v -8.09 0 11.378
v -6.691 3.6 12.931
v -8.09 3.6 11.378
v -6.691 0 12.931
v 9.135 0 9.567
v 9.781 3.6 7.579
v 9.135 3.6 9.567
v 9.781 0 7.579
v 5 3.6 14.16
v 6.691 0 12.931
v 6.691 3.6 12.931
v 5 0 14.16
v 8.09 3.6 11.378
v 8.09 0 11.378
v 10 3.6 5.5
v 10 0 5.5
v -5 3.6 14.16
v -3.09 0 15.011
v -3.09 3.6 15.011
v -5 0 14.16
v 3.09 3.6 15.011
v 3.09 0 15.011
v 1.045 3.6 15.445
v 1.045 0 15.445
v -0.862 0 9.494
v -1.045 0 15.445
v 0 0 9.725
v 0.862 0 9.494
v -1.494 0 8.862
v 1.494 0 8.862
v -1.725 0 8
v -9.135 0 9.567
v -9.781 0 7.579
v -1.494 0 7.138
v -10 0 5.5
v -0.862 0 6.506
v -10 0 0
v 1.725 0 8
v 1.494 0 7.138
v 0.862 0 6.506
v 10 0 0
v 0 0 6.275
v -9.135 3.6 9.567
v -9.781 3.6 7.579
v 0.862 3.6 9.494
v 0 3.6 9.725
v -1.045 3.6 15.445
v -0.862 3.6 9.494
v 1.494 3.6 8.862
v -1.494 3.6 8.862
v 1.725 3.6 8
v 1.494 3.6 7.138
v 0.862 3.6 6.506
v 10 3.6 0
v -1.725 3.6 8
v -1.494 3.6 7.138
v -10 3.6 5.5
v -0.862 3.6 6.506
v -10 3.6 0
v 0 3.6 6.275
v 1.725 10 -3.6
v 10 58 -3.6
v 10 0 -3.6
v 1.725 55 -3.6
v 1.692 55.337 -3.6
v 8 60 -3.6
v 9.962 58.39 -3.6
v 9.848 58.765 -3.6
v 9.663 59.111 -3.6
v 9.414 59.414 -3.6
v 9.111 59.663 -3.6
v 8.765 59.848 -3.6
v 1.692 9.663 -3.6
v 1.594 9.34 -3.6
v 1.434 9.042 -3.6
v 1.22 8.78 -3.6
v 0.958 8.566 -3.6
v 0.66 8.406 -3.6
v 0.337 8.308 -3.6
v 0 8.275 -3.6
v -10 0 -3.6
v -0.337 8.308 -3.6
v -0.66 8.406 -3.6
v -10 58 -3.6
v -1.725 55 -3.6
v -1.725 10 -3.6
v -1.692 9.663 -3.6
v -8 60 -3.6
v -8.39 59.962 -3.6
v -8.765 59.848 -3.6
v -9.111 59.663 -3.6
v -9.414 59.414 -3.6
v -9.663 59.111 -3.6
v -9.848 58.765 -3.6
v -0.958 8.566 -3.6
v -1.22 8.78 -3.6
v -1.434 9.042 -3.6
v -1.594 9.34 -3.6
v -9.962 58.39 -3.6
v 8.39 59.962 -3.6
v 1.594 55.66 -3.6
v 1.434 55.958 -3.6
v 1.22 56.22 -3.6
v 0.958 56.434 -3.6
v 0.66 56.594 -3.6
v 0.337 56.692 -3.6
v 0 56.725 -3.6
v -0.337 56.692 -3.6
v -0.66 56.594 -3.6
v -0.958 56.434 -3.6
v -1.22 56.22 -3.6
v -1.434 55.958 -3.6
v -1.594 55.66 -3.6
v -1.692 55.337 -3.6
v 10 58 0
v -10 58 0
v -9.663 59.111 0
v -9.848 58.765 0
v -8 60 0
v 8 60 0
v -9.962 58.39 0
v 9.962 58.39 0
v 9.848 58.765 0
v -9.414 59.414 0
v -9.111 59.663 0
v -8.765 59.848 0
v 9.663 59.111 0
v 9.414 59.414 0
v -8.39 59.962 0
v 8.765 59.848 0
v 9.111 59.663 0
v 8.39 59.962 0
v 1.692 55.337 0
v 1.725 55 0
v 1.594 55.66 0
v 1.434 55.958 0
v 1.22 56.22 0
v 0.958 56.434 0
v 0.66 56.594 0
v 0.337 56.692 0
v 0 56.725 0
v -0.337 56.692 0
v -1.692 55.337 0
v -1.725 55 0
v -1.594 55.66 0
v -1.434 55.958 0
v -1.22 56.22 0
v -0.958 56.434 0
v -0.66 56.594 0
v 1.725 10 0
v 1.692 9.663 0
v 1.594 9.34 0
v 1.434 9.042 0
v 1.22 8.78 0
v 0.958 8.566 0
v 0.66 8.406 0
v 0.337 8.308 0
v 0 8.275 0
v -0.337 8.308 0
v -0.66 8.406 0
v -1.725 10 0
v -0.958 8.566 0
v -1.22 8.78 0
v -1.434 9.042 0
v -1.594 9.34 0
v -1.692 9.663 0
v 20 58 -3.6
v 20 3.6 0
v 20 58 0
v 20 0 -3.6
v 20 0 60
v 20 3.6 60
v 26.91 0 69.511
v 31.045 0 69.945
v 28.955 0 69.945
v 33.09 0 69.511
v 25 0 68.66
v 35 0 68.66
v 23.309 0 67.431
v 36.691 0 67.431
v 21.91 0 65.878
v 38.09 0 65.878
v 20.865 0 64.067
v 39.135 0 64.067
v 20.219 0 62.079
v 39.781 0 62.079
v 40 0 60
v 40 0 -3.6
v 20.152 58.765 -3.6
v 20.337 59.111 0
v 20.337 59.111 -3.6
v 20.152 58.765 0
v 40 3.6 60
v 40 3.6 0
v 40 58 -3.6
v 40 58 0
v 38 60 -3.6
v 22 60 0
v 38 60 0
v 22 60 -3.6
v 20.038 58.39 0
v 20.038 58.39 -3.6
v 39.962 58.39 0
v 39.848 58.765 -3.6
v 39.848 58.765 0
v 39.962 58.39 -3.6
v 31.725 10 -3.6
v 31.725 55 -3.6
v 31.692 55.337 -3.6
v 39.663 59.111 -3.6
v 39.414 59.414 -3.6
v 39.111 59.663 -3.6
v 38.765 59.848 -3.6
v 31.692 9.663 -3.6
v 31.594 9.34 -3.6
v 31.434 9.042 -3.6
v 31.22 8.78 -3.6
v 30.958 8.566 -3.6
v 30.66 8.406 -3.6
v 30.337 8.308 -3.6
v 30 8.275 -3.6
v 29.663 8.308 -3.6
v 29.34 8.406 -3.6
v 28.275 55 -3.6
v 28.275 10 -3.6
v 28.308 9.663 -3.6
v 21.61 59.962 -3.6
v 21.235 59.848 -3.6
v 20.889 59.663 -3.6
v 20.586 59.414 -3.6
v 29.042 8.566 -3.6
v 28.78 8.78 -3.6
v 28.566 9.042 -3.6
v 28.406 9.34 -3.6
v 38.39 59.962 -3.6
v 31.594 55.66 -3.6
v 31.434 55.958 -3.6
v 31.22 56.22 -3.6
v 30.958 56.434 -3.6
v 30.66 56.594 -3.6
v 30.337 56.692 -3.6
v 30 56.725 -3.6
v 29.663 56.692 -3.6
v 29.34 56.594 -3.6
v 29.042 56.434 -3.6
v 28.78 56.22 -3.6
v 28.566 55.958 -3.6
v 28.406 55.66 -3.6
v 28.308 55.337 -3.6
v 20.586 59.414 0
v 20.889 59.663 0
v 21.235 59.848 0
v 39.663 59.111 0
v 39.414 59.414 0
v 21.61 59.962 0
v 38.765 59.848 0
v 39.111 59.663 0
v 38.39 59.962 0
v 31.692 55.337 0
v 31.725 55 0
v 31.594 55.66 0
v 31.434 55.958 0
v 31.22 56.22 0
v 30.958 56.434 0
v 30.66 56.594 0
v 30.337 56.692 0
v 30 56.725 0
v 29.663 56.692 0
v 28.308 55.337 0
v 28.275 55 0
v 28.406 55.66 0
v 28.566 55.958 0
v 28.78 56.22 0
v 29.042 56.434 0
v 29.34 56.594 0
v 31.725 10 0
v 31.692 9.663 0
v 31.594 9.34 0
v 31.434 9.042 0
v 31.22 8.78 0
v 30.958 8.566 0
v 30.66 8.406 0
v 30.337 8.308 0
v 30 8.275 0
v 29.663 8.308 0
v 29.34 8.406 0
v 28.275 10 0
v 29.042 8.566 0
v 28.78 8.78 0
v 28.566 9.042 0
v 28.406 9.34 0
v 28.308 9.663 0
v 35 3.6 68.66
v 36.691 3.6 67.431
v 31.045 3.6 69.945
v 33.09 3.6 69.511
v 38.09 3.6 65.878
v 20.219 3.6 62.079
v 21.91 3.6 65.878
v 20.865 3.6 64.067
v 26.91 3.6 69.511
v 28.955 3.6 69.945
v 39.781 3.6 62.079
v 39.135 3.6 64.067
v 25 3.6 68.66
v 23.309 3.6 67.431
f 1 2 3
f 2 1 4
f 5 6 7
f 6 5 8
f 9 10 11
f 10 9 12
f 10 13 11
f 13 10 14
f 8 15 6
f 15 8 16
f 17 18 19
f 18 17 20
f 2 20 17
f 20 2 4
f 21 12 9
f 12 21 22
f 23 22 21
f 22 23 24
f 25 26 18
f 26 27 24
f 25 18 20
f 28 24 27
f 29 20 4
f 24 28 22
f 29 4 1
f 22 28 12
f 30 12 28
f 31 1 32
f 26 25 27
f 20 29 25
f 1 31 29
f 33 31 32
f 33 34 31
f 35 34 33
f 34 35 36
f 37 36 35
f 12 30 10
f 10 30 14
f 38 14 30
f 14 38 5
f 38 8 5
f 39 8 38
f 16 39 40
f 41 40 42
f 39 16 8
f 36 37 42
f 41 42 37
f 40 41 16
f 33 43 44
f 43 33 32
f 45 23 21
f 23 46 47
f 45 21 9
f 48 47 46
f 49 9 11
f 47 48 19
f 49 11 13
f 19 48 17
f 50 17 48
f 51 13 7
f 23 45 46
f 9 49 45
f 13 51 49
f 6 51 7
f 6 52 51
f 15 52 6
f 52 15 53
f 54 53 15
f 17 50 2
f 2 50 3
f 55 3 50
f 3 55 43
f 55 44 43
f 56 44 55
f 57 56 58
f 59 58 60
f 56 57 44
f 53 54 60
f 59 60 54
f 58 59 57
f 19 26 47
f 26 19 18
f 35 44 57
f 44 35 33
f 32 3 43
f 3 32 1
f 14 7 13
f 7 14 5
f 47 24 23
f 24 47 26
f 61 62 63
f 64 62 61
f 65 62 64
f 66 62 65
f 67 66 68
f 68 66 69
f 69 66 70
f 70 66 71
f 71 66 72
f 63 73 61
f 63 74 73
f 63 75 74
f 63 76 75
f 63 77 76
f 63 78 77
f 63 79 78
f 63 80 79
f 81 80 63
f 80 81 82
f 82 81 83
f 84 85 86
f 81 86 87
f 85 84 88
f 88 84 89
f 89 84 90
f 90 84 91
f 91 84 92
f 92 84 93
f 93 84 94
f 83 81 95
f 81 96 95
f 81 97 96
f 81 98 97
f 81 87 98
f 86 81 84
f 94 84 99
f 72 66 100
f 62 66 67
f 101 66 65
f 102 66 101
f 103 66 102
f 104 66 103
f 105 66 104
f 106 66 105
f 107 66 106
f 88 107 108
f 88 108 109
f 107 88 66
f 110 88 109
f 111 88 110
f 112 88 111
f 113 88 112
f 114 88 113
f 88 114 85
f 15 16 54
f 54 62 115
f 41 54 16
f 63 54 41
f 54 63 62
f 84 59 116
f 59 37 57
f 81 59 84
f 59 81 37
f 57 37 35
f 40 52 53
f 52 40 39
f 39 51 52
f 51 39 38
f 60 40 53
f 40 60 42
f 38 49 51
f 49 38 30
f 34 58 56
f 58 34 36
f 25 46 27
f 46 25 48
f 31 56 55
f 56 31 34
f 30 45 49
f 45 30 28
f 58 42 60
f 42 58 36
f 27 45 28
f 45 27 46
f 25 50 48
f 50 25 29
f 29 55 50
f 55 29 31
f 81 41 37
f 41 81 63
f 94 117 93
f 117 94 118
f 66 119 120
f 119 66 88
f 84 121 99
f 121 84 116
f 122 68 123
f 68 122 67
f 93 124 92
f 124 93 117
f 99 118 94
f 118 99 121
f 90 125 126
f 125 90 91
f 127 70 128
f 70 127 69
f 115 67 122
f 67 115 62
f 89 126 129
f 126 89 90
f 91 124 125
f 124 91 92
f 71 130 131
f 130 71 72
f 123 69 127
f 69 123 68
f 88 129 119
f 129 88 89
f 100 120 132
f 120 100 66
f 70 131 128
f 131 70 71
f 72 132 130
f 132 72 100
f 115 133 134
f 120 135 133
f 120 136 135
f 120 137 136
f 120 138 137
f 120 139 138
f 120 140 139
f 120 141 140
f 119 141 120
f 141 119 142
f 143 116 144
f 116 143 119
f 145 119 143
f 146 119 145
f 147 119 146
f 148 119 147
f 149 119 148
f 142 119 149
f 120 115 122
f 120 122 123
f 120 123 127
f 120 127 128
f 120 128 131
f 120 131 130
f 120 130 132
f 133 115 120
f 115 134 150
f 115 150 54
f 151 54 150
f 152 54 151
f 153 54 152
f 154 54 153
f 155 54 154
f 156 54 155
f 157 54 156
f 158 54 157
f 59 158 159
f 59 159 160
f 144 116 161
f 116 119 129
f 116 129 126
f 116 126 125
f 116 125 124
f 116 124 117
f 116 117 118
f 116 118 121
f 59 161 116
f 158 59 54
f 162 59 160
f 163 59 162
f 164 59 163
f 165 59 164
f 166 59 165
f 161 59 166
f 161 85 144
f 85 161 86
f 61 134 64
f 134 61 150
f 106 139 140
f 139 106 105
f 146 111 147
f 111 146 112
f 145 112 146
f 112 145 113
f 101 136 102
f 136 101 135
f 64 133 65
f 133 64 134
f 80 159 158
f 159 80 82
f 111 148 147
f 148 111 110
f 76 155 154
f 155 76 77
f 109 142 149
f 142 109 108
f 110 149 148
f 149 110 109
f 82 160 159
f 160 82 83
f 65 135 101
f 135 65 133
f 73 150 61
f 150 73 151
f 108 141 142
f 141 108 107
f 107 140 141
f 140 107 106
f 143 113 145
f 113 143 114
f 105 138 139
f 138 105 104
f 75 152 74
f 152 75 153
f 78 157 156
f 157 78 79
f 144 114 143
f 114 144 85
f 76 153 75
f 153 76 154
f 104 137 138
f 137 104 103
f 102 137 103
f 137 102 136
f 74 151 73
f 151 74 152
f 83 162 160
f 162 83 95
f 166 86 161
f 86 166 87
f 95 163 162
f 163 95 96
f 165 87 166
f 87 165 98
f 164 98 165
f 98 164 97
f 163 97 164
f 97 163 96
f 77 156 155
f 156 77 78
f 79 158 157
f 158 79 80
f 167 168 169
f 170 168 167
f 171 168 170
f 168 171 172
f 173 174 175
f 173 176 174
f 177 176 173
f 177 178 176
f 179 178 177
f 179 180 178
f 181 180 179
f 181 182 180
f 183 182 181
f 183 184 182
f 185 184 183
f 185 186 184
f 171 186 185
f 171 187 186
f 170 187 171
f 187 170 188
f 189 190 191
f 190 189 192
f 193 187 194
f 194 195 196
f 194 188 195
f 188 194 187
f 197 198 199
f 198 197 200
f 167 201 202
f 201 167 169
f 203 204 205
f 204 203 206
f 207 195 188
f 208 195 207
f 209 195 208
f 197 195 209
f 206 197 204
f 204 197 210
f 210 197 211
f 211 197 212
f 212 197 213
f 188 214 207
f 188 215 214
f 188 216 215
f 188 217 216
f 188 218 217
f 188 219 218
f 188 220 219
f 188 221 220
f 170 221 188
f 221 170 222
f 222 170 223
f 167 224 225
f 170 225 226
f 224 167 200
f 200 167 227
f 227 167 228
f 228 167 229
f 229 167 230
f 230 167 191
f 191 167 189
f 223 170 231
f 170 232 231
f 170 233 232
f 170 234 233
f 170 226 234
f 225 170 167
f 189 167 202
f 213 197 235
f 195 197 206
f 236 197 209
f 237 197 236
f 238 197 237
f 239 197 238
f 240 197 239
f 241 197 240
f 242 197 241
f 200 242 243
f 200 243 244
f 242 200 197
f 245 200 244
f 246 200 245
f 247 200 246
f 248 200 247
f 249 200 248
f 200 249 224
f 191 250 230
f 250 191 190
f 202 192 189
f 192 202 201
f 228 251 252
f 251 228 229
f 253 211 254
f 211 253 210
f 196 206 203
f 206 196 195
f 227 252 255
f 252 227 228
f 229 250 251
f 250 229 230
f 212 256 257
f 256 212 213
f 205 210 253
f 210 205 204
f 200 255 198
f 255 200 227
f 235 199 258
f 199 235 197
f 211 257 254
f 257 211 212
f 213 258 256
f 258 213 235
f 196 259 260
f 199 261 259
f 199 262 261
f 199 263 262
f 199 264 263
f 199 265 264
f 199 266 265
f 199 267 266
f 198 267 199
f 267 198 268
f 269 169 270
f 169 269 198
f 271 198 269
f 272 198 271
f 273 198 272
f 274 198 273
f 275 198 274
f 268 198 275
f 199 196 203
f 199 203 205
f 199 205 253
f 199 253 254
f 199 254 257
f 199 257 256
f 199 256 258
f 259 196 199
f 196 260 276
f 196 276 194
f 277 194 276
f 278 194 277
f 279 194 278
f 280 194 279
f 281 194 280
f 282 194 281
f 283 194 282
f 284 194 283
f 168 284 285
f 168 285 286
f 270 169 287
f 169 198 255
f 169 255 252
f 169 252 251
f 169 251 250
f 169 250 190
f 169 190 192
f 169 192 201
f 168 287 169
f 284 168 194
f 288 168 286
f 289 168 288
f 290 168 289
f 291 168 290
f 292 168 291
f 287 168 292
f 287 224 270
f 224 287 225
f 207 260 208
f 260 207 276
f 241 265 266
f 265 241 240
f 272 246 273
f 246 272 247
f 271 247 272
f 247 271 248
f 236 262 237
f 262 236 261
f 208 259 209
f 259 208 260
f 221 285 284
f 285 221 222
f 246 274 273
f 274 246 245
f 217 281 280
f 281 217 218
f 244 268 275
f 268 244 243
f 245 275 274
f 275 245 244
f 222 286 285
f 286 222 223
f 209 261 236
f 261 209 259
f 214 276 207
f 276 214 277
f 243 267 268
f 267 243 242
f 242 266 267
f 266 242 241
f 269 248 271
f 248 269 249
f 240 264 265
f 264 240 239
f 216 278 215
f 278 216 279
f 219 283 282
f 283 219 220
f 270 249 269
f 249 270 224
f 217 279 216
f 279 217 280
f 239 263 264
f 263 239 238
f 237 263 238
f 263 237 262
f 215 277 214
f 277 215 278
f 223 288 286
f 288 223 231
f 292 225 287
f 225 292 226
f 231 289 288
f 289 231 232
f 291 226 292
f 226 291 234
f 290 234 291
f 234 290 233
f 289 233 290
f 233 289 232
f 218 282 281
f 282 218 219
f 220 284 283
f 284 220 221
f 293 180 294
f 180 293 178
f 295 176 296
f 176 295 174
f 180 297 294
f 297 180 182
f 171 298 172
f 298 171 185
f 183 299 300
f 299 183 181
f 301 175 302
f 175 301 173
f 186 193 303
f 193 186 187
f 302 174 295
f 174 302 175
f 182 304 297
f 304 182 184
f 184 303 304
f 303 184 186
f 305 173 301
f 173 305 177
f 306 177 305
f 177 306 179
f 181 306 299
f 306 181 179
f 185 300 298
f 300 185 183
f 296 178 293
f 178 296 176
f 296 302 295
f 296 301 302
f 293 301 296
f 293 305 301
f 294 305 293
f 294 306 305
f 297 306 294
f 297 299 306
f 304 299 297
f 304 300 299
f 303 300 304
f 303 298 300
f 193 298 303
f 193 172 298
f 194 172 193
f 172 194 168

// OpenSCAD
// file: configuration.scad
// Increase this if your slicer or printer make holes too tight.
extra_radius = 0.1;

// OD = outside diameter, corner to corner.
m3_nut_od = 6.1;
m3_nut_radius = m3_nut_od/2 + 0.2 + extra_radius;
m3_nut_tight_radius = m3_nut_radius - extra_radius/2;
m3_washer_radius = 3.5 + extra_radius;

// Major diameter of metric 3mm thread.
m3_major = 2.85;
m3_radius = m3_major/2 + extra_radius;
m3_wide_radius = m3_major/2 + extra_radius + 0.2;

// NEMA17 stepper motors.
motor_shaft_diameter = 5;
motor_shaft_radius = motor_shaft_diameter/2 + extra_radius;

// Frame brackets. M3x8mm screws work best with 3.6 mm brackets.
thickness = 3.6;

// OpenBeam or Misumi. Currently only 15x15 mm, but there is a plan
// to make models more parametric and allow 20x20 mm in the future.
extrusion = 15;

// Placement for the NEMA17 stepper motors.
motor_offset = 44;
motor_length = 47;

probe_tunnel_radius = 1.25 + extra_radius;
probe_excentricity = 5;
// main file
include <configuration.scad>;

sticky_width = 20;
sticky_length = thickness;
sticky_offset = 8;  // Distance from screw center to glass edge.

// Make the round edge line up with the outside of OpenBeam.
screw_offset = sticky_width/2 - 7.5;
cube_length = sticky_length + sticky_offset - screw_offset;
arm_length = 60;
clamp_depth = 60;

module plate() {
    difference() {
        hull() {
            translate([-sticky_width/2, 0, 0])
            cube([sticky_width, thickness, arm_length - corner_radius]);
            corner_radius = 2;
            for(x=[-1, 1])
                translate([
                    x * (sticky_width/2 - corner_radius),
                    0,
                    arm_length - corner_radius
                ])
                rotate([-90, 0, 0])
                cylinder(r = corner_radius, h=thickness, $fn=32);
        }
        
        hull() {
            for(z=[10, arm_length - 5]) {
                translate([0, 5, z])
                rotate([90, 0, 0])
                cylinder(r = m3_wide_radius, h=10, $fn=32);
            }
        }
    }
}

module bottom_arm() {
    translate([0, -sticky_offset, 0]) {
        difference() {
            translate([0, screw_offset, thickness/2]) {
                difference() {
                    cylinder(r=sticky_width/2, h=thickness, center=true);
                    translate([-50, sticky_offset + thickness - screw_offset, -50])
                    cube([100,100,100], center=false);
                }
                translate([0, cube_length/2, 0])
                cube([sticky_width, cube_length, thickness], center=true);
            }
            cylinder(r=m3_wide_radius, h=20, center=true, $fn=12);
        }

    }

    plate();
}

module top_arm() {
    translate([0, -clamp_depth, 0]) hull() {
        cylinder(r=sticky_width/2, h=thickness, center=false);


        translate([-sticky_width/2, clamp_depth, 0])
        cube([sticky_width, thickness, thickness], center=false);
    }

    plate();
}

rotate([-90, 0, 0])
{
    bottom_arm();
    translate([30, 0, 0]) top_arm();
}
